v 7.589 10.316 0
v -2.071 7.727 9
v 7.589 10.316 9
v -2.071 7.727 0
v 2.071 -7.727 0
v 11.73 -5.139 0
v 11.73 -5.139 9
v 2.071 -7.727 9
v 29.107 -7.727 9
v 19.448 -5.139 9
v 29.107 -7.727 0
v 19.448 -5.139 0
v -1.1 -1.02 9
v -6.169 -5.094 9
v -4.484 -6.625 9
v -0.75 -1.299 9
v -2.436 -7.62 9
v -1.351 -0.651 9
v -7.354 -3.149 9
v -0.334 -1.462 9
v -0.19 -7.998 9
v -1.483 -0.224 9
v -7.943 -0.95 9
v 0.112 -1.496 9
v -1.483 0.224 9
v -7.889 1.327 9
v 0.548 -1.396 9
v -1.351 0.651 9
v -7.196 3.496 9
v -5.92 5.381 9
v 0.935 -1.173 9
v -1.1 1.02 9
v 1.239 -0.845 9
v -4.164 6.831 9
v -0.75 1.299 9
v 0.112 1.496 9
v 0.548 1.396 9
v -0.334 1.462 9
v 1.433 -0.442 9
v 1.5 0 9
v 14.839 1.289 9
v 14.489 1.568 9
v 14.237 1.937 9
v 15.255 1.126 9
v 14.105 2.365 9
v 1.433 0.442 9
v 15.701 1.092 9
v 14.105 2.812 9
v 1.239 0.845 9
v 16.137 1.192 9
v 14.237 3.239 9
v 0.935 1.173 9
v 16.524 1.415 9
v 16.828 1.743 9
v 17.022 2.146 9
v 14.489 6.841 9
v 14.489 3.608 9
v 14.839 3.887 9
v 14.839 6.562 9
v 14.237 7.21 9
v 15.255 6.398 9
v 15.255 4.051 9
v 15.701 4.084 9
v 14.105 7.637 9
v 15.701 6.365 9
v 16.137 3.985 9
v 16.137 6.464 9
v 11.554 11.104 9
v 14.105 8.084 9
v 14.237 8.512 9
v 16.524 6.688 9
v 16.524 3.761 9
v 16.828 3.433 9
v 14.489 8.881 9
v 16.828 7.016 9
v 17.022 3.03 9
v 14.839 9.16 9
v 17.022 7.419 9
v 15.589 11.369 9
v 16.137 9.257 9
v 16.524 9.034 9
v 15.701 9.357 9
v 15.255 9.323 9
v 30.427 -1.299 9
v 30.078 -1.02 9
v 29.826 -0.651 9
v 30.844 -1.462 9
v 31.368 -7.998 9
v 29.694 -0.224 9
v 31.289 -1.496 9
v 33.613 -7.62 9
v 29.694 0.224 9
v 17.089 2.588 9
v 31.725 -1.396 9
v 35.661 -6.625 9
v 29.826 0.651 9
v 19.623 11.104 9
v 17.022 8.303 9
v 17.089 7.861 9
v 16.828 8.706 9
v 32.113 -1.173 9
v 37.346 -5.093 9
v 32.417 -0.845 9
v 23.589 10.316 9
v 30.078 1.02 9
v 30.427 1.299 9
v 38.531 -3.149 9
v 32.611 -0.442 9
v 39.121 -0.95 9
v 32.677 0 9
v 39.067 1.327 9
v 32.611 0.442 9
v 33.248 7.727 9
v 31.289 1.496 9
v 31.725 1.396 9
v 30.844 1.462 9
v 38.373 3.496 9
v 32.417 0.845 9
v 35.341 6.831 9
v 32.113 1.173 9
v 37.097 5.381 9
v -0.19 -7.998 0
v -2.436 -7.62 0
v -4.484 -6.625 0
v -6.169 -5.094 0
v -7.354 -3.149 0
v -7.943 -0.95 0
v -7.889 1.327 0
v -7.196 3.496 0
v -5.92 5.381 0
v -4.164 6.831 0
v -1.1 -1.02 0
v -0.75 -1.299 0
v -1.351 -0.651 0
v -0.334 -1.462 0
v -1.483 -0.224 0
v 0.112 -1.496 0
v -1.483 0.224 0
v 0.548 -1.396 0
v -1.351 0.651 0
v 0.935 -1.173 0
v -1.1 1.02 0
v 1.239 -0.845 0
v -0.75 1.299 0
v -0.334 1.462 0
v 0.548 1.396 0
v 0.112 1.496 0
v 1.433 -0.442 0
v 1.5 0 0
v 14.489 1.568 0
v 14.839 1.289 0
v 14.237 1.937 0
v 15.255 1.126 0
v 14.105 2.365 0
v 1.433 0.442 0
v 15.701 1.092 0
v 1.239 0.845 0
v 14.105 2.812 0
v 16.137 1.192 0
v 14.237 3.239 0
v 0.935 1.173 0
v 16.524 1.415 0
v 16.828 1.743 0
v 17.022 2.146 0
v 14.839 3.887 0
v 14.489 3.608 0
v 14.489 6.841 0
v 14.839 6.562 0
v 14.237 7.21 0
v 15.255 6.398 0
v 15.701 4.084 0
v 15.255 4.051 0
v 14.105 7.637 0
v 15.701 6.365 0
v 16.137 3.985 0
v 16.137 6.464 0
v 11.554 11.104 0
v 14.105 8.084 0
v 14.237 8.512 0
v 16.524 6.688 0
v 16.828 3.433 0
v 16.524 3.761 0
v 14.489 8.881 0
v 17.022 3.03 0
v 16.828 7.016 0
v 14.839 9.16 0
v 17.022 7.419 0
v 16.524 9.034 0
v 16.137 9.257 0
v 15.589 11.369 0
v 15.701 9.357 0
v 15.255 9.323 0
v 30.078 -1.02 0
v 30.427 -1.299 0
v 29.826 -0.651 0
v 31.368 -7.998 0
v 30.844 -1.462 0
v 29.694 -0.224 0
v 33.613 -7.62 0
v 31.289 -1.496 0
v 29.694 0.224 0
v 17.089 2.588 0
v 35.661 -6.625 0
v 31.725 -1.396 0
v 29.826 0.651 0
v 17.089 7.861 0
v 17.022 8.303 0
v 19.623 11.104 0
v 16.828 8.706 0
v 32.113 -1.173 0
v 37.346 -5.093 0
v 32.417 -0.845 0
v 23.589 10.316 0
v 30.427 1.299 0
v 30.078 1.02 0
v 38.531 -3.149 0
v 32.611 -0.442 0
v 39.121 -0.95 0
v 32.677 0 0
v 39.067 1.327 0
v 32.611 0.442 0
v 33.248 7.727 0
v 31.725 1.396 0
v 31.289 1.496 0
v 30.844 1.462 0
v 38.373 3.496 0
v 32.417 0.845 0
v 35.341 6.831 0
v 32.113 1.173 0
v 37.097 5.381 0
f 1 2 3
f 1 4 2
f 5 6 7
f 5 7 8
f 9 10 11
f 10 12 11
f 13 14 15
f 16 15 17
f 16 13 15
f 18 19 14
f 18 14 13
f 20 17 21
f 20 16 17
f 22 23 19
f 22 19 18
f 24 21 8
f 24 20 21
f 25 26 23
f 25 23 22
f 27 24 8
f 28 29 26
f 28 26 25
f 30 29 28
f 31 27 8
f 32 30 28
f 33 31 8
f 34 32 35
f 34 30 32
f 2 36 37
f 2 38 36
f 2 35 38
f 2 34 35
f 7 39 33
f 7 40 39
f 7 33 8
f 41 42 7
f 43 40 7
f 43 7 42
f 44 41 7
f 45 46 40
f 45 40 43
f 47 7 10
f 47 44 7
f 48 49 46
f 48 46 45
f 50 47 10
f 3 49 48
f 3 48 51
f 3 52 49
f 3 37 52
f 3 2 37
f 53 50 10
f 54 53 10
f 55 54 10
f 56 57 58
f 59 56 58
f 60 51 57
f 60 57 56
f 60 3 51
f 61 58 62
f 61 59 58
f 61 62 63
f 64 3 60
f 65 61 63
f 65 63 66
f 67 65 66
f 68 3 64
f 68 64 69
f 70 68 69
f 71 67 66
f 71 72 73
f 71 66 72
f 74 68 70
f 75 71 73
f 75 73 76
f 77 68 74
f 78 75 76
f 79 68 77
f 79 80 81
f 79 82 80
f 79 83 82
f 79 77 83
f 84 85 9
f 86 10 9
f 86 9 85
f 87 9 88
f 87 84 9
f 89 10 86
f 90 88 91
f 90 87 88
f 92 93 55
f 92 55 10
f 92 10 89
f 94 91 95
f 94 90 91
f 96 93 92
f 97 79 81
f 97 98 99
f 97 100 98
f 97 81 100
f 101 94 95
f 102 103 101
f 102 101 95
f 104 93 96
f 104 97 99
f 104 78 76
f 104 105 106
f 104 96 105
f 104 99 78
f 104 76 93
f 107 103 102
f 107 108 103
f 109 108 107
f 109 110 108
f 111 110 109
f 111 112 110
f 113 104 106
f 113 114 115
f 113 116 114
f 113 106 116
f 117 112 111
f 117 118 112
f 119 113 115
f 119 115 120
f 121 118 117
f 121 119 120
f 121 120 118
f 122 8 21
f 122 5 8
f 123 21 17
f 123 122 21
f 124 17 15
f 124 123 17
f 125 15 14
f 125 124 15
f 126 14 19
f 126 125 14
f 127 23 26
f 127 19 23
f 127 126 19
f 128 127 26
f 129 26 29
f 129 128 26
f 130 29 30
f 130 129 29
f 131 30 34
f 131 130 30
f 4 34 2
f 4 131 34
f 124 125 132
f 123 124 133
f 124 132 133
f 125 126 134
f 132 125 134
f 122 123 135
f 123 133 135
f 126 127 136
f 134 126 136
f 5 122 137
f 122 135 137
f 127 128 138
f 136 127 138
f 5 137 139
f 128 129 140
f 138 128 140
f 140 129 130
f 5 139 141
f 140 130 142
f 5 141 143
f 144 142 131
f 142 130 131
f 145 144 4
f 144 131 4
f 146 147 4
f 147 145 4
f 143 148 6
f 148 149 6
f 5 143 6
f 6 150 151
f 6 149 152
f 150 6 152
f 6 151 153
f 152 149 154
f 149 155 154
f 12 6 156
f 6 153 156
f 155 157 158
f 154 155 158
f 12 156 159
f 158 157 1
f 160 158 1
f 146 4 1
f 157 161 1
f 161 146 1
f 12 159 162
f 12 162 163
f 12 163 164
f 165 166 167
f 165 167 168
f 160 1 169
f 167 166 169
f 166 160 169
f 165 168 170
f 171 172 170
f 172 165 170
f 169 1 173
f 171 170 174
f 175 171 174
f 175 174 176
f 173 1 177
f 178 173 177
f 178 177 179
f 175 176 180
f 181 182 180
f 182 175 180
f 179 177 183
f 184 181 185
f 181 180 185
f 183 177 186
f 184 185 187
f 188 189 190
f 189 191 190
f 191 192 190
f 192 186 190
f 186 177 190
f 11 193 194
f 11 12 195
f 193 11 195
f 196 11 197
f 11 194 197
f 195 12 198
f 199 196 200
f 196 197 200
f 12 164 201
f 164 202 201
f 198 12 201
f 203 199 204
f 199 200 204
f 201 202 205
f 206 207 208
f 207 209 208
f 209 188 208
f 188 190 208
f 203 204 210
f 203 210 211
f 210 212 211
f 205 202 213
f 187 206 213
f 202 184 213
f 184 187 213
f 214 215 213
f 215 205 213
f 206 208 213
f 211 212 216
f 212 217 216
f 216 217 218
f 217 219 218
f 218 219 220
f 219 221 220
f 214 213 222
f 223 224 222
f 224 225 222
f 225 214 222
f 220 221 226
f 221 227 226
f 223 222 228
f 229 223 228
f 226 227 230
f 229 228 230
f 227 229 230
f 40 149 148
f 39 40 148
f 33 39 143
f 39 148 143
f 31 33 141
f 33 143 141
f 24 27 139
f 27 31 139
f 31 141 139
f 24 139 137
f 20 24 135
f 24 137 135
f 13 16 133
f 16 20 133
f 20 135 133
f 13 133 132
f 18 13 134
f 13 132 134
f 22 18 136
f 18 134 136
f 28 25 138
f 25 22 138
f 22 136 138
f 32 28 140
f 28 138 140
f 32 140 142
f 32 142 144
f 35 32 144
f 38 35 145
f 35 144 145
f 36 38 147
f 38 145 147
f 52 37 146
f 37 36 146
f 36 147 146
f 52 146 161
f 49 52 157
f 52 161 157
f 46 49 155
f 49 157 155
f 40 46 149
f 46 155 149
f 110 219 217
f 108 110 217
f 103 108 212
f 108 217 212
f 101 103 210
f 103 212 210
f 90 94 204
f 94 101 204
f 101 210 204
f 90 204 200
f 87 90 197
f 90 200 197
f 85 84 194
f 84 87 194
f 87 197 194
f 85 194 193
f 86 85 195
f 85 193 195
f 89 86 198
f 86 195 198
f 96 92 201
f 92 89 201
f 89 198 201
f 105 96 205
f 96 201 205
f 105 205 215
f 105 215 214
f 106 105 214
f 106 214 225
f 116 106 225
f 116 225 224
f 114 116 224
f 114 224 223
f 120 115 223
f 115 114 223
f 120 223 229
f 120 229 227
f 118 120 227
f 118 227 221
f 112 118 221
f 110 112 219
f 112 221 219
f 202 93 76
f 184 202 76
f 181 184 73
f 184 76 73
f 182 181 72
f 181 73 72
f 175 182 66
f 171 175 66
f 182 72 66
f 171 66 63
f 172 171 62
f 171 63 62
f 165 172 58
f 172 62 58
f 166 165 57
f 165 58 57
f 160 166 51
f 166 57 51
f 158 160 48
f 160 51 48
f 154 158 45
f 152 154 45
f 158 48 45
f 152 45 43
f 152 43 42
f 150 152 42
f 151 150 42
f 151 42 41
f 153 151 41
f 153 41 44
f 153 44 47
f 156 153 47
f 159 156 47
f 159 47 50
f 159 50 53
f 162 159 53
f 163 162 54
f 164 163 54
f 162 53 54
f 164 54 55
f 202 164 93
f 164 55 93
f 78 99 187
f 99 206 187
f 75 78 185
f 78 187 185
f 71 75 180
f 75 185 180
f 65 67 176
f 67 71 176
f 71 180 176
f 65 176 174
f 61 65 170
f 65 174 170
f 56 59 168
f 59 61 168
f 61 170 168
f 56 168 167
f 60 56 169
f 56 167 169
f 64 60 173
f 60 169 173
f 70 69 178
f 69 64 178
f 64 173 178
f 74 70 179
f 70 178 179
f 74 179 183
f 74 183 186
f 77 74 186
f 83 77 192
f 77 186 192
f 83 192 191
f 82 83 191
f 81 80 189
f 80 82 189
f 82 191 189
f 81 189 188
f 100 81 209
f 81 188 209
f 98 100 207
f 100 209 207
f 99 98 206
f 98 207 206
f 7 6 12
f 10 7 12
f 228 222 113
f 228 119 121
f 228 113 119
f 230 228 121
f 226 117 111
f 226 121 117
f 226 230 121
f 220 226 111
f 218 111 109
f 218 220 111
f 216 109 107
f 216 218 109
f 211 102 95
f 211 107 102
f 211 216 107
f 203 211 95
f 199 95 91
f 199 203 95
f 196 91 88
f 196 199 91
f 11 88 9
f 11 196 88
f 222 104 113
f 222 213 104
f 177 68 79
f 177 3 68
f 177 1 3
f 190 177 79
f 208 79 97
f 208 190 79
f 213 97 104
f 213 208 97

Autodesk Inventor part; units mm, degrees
ref_plane "YZ Plane" through (0, 0, 0) normal (1, 0, 0) x (0, 1, 0)
ref_plane "XZ Plane" through (0, 0, 0) normal (0, 1, 0) x (-1, 0, 0)
ref_plane "XY Plane" through (0, 0, 0) normal (0, 0, 1) x (1, 0, 0)
sketch "Sketch1" plane through (0, 0, 0) normal (0, 0, 1) x (1, 0, 0)
  line L0 (19.4476, -5.1392) -> (29.1069, -7.7274)
  line L1 (19.4476, -5.1392) -> (23.5887, 10.3156) construction
  line L2 (11.7298, -5.1392) -> (19.4476, -5.1392)
  line L3 (7.5887, 10.3156) -> (11.7298, -5.1392) construction
  line L4 (7.5887, 10.3156) -> (23.5887, 10.3156) construction
  arc A0 (23.5887, 10.3156) -> (7.5887, 10.3156) centre (15.5887, -19.5408) ccw
  line L5 (11.7298, -5.1392) -> (2.0706, -7.7274)
  line L6 (-2.0706, 7.7274) -> (7.5887, 10.3156)
  arc A1 (-2.0706, 7.7274) -> (2.0706, -7.7274) centre (0, 0) ccw
  circle A2 centre (0, 0) radius 8 construction
  circle A3 centre (31.1774, 0) radius 8 construction
  arc A4 (29.1069, -7.7274) -> (33.248, 7.7274) centre (31.1774, 0) ccw
  line L7 (23.5887, 10.3156) -> (33.248, 7.7274)
  circle A5 centre (0, 0) radius 1.5
  circle A6 centre (31.1774, 0) radius 1.5
  circle A7 centre (15.5887, 7.8608) radius 1.5
  point P0 (0, 0)
  point P1 (15.5887, 10.3156)
  dimension "d0" = 16
  dimension "d1" = 16
  dimension "d2" = 16
  dimension "d3" = 10
  dimension "d4" = 10
  dimension "d5" = 16
  dimension "d6" = 16
  dimension "d7" = 75
  dimension "d8" = 3
  dimension "d9" = 3
  dimension "d10" = 3
  dimension "d11" = 13
extrude "Extrusion1" add sketch "Sketch1" along normal blind 9
sketch "Sketch3" plane through (0, 0, 9) normal (0, 0, 1) x (1, 0, 0)
  circle A0 centre (15.5887, 2.5882) radius 1.5
  line L0 (11.7298, -5.1392) -> (19.4476, -5.1392) construction
  line L1 (7.5887, 10.3156) -> (-2.0706, 7.7274) construction
  line L2 (33.248, 7.7274) -> (23.5887, 10.3156) construction
  line L3 (7.5887, 10.3156) -> (23.5887, 10.3156) construction
  line L4 (15.5887, 10.3156) -> (15.5887, -5.1392) construction
  point P0 (0, 0)
  point P1 (15.5887, 2.5882)
  dimension "d19" = 3
extrude "Extrusion3" cut sketch "Sketch3" against normal through all
properties material "ABS Plastic"
